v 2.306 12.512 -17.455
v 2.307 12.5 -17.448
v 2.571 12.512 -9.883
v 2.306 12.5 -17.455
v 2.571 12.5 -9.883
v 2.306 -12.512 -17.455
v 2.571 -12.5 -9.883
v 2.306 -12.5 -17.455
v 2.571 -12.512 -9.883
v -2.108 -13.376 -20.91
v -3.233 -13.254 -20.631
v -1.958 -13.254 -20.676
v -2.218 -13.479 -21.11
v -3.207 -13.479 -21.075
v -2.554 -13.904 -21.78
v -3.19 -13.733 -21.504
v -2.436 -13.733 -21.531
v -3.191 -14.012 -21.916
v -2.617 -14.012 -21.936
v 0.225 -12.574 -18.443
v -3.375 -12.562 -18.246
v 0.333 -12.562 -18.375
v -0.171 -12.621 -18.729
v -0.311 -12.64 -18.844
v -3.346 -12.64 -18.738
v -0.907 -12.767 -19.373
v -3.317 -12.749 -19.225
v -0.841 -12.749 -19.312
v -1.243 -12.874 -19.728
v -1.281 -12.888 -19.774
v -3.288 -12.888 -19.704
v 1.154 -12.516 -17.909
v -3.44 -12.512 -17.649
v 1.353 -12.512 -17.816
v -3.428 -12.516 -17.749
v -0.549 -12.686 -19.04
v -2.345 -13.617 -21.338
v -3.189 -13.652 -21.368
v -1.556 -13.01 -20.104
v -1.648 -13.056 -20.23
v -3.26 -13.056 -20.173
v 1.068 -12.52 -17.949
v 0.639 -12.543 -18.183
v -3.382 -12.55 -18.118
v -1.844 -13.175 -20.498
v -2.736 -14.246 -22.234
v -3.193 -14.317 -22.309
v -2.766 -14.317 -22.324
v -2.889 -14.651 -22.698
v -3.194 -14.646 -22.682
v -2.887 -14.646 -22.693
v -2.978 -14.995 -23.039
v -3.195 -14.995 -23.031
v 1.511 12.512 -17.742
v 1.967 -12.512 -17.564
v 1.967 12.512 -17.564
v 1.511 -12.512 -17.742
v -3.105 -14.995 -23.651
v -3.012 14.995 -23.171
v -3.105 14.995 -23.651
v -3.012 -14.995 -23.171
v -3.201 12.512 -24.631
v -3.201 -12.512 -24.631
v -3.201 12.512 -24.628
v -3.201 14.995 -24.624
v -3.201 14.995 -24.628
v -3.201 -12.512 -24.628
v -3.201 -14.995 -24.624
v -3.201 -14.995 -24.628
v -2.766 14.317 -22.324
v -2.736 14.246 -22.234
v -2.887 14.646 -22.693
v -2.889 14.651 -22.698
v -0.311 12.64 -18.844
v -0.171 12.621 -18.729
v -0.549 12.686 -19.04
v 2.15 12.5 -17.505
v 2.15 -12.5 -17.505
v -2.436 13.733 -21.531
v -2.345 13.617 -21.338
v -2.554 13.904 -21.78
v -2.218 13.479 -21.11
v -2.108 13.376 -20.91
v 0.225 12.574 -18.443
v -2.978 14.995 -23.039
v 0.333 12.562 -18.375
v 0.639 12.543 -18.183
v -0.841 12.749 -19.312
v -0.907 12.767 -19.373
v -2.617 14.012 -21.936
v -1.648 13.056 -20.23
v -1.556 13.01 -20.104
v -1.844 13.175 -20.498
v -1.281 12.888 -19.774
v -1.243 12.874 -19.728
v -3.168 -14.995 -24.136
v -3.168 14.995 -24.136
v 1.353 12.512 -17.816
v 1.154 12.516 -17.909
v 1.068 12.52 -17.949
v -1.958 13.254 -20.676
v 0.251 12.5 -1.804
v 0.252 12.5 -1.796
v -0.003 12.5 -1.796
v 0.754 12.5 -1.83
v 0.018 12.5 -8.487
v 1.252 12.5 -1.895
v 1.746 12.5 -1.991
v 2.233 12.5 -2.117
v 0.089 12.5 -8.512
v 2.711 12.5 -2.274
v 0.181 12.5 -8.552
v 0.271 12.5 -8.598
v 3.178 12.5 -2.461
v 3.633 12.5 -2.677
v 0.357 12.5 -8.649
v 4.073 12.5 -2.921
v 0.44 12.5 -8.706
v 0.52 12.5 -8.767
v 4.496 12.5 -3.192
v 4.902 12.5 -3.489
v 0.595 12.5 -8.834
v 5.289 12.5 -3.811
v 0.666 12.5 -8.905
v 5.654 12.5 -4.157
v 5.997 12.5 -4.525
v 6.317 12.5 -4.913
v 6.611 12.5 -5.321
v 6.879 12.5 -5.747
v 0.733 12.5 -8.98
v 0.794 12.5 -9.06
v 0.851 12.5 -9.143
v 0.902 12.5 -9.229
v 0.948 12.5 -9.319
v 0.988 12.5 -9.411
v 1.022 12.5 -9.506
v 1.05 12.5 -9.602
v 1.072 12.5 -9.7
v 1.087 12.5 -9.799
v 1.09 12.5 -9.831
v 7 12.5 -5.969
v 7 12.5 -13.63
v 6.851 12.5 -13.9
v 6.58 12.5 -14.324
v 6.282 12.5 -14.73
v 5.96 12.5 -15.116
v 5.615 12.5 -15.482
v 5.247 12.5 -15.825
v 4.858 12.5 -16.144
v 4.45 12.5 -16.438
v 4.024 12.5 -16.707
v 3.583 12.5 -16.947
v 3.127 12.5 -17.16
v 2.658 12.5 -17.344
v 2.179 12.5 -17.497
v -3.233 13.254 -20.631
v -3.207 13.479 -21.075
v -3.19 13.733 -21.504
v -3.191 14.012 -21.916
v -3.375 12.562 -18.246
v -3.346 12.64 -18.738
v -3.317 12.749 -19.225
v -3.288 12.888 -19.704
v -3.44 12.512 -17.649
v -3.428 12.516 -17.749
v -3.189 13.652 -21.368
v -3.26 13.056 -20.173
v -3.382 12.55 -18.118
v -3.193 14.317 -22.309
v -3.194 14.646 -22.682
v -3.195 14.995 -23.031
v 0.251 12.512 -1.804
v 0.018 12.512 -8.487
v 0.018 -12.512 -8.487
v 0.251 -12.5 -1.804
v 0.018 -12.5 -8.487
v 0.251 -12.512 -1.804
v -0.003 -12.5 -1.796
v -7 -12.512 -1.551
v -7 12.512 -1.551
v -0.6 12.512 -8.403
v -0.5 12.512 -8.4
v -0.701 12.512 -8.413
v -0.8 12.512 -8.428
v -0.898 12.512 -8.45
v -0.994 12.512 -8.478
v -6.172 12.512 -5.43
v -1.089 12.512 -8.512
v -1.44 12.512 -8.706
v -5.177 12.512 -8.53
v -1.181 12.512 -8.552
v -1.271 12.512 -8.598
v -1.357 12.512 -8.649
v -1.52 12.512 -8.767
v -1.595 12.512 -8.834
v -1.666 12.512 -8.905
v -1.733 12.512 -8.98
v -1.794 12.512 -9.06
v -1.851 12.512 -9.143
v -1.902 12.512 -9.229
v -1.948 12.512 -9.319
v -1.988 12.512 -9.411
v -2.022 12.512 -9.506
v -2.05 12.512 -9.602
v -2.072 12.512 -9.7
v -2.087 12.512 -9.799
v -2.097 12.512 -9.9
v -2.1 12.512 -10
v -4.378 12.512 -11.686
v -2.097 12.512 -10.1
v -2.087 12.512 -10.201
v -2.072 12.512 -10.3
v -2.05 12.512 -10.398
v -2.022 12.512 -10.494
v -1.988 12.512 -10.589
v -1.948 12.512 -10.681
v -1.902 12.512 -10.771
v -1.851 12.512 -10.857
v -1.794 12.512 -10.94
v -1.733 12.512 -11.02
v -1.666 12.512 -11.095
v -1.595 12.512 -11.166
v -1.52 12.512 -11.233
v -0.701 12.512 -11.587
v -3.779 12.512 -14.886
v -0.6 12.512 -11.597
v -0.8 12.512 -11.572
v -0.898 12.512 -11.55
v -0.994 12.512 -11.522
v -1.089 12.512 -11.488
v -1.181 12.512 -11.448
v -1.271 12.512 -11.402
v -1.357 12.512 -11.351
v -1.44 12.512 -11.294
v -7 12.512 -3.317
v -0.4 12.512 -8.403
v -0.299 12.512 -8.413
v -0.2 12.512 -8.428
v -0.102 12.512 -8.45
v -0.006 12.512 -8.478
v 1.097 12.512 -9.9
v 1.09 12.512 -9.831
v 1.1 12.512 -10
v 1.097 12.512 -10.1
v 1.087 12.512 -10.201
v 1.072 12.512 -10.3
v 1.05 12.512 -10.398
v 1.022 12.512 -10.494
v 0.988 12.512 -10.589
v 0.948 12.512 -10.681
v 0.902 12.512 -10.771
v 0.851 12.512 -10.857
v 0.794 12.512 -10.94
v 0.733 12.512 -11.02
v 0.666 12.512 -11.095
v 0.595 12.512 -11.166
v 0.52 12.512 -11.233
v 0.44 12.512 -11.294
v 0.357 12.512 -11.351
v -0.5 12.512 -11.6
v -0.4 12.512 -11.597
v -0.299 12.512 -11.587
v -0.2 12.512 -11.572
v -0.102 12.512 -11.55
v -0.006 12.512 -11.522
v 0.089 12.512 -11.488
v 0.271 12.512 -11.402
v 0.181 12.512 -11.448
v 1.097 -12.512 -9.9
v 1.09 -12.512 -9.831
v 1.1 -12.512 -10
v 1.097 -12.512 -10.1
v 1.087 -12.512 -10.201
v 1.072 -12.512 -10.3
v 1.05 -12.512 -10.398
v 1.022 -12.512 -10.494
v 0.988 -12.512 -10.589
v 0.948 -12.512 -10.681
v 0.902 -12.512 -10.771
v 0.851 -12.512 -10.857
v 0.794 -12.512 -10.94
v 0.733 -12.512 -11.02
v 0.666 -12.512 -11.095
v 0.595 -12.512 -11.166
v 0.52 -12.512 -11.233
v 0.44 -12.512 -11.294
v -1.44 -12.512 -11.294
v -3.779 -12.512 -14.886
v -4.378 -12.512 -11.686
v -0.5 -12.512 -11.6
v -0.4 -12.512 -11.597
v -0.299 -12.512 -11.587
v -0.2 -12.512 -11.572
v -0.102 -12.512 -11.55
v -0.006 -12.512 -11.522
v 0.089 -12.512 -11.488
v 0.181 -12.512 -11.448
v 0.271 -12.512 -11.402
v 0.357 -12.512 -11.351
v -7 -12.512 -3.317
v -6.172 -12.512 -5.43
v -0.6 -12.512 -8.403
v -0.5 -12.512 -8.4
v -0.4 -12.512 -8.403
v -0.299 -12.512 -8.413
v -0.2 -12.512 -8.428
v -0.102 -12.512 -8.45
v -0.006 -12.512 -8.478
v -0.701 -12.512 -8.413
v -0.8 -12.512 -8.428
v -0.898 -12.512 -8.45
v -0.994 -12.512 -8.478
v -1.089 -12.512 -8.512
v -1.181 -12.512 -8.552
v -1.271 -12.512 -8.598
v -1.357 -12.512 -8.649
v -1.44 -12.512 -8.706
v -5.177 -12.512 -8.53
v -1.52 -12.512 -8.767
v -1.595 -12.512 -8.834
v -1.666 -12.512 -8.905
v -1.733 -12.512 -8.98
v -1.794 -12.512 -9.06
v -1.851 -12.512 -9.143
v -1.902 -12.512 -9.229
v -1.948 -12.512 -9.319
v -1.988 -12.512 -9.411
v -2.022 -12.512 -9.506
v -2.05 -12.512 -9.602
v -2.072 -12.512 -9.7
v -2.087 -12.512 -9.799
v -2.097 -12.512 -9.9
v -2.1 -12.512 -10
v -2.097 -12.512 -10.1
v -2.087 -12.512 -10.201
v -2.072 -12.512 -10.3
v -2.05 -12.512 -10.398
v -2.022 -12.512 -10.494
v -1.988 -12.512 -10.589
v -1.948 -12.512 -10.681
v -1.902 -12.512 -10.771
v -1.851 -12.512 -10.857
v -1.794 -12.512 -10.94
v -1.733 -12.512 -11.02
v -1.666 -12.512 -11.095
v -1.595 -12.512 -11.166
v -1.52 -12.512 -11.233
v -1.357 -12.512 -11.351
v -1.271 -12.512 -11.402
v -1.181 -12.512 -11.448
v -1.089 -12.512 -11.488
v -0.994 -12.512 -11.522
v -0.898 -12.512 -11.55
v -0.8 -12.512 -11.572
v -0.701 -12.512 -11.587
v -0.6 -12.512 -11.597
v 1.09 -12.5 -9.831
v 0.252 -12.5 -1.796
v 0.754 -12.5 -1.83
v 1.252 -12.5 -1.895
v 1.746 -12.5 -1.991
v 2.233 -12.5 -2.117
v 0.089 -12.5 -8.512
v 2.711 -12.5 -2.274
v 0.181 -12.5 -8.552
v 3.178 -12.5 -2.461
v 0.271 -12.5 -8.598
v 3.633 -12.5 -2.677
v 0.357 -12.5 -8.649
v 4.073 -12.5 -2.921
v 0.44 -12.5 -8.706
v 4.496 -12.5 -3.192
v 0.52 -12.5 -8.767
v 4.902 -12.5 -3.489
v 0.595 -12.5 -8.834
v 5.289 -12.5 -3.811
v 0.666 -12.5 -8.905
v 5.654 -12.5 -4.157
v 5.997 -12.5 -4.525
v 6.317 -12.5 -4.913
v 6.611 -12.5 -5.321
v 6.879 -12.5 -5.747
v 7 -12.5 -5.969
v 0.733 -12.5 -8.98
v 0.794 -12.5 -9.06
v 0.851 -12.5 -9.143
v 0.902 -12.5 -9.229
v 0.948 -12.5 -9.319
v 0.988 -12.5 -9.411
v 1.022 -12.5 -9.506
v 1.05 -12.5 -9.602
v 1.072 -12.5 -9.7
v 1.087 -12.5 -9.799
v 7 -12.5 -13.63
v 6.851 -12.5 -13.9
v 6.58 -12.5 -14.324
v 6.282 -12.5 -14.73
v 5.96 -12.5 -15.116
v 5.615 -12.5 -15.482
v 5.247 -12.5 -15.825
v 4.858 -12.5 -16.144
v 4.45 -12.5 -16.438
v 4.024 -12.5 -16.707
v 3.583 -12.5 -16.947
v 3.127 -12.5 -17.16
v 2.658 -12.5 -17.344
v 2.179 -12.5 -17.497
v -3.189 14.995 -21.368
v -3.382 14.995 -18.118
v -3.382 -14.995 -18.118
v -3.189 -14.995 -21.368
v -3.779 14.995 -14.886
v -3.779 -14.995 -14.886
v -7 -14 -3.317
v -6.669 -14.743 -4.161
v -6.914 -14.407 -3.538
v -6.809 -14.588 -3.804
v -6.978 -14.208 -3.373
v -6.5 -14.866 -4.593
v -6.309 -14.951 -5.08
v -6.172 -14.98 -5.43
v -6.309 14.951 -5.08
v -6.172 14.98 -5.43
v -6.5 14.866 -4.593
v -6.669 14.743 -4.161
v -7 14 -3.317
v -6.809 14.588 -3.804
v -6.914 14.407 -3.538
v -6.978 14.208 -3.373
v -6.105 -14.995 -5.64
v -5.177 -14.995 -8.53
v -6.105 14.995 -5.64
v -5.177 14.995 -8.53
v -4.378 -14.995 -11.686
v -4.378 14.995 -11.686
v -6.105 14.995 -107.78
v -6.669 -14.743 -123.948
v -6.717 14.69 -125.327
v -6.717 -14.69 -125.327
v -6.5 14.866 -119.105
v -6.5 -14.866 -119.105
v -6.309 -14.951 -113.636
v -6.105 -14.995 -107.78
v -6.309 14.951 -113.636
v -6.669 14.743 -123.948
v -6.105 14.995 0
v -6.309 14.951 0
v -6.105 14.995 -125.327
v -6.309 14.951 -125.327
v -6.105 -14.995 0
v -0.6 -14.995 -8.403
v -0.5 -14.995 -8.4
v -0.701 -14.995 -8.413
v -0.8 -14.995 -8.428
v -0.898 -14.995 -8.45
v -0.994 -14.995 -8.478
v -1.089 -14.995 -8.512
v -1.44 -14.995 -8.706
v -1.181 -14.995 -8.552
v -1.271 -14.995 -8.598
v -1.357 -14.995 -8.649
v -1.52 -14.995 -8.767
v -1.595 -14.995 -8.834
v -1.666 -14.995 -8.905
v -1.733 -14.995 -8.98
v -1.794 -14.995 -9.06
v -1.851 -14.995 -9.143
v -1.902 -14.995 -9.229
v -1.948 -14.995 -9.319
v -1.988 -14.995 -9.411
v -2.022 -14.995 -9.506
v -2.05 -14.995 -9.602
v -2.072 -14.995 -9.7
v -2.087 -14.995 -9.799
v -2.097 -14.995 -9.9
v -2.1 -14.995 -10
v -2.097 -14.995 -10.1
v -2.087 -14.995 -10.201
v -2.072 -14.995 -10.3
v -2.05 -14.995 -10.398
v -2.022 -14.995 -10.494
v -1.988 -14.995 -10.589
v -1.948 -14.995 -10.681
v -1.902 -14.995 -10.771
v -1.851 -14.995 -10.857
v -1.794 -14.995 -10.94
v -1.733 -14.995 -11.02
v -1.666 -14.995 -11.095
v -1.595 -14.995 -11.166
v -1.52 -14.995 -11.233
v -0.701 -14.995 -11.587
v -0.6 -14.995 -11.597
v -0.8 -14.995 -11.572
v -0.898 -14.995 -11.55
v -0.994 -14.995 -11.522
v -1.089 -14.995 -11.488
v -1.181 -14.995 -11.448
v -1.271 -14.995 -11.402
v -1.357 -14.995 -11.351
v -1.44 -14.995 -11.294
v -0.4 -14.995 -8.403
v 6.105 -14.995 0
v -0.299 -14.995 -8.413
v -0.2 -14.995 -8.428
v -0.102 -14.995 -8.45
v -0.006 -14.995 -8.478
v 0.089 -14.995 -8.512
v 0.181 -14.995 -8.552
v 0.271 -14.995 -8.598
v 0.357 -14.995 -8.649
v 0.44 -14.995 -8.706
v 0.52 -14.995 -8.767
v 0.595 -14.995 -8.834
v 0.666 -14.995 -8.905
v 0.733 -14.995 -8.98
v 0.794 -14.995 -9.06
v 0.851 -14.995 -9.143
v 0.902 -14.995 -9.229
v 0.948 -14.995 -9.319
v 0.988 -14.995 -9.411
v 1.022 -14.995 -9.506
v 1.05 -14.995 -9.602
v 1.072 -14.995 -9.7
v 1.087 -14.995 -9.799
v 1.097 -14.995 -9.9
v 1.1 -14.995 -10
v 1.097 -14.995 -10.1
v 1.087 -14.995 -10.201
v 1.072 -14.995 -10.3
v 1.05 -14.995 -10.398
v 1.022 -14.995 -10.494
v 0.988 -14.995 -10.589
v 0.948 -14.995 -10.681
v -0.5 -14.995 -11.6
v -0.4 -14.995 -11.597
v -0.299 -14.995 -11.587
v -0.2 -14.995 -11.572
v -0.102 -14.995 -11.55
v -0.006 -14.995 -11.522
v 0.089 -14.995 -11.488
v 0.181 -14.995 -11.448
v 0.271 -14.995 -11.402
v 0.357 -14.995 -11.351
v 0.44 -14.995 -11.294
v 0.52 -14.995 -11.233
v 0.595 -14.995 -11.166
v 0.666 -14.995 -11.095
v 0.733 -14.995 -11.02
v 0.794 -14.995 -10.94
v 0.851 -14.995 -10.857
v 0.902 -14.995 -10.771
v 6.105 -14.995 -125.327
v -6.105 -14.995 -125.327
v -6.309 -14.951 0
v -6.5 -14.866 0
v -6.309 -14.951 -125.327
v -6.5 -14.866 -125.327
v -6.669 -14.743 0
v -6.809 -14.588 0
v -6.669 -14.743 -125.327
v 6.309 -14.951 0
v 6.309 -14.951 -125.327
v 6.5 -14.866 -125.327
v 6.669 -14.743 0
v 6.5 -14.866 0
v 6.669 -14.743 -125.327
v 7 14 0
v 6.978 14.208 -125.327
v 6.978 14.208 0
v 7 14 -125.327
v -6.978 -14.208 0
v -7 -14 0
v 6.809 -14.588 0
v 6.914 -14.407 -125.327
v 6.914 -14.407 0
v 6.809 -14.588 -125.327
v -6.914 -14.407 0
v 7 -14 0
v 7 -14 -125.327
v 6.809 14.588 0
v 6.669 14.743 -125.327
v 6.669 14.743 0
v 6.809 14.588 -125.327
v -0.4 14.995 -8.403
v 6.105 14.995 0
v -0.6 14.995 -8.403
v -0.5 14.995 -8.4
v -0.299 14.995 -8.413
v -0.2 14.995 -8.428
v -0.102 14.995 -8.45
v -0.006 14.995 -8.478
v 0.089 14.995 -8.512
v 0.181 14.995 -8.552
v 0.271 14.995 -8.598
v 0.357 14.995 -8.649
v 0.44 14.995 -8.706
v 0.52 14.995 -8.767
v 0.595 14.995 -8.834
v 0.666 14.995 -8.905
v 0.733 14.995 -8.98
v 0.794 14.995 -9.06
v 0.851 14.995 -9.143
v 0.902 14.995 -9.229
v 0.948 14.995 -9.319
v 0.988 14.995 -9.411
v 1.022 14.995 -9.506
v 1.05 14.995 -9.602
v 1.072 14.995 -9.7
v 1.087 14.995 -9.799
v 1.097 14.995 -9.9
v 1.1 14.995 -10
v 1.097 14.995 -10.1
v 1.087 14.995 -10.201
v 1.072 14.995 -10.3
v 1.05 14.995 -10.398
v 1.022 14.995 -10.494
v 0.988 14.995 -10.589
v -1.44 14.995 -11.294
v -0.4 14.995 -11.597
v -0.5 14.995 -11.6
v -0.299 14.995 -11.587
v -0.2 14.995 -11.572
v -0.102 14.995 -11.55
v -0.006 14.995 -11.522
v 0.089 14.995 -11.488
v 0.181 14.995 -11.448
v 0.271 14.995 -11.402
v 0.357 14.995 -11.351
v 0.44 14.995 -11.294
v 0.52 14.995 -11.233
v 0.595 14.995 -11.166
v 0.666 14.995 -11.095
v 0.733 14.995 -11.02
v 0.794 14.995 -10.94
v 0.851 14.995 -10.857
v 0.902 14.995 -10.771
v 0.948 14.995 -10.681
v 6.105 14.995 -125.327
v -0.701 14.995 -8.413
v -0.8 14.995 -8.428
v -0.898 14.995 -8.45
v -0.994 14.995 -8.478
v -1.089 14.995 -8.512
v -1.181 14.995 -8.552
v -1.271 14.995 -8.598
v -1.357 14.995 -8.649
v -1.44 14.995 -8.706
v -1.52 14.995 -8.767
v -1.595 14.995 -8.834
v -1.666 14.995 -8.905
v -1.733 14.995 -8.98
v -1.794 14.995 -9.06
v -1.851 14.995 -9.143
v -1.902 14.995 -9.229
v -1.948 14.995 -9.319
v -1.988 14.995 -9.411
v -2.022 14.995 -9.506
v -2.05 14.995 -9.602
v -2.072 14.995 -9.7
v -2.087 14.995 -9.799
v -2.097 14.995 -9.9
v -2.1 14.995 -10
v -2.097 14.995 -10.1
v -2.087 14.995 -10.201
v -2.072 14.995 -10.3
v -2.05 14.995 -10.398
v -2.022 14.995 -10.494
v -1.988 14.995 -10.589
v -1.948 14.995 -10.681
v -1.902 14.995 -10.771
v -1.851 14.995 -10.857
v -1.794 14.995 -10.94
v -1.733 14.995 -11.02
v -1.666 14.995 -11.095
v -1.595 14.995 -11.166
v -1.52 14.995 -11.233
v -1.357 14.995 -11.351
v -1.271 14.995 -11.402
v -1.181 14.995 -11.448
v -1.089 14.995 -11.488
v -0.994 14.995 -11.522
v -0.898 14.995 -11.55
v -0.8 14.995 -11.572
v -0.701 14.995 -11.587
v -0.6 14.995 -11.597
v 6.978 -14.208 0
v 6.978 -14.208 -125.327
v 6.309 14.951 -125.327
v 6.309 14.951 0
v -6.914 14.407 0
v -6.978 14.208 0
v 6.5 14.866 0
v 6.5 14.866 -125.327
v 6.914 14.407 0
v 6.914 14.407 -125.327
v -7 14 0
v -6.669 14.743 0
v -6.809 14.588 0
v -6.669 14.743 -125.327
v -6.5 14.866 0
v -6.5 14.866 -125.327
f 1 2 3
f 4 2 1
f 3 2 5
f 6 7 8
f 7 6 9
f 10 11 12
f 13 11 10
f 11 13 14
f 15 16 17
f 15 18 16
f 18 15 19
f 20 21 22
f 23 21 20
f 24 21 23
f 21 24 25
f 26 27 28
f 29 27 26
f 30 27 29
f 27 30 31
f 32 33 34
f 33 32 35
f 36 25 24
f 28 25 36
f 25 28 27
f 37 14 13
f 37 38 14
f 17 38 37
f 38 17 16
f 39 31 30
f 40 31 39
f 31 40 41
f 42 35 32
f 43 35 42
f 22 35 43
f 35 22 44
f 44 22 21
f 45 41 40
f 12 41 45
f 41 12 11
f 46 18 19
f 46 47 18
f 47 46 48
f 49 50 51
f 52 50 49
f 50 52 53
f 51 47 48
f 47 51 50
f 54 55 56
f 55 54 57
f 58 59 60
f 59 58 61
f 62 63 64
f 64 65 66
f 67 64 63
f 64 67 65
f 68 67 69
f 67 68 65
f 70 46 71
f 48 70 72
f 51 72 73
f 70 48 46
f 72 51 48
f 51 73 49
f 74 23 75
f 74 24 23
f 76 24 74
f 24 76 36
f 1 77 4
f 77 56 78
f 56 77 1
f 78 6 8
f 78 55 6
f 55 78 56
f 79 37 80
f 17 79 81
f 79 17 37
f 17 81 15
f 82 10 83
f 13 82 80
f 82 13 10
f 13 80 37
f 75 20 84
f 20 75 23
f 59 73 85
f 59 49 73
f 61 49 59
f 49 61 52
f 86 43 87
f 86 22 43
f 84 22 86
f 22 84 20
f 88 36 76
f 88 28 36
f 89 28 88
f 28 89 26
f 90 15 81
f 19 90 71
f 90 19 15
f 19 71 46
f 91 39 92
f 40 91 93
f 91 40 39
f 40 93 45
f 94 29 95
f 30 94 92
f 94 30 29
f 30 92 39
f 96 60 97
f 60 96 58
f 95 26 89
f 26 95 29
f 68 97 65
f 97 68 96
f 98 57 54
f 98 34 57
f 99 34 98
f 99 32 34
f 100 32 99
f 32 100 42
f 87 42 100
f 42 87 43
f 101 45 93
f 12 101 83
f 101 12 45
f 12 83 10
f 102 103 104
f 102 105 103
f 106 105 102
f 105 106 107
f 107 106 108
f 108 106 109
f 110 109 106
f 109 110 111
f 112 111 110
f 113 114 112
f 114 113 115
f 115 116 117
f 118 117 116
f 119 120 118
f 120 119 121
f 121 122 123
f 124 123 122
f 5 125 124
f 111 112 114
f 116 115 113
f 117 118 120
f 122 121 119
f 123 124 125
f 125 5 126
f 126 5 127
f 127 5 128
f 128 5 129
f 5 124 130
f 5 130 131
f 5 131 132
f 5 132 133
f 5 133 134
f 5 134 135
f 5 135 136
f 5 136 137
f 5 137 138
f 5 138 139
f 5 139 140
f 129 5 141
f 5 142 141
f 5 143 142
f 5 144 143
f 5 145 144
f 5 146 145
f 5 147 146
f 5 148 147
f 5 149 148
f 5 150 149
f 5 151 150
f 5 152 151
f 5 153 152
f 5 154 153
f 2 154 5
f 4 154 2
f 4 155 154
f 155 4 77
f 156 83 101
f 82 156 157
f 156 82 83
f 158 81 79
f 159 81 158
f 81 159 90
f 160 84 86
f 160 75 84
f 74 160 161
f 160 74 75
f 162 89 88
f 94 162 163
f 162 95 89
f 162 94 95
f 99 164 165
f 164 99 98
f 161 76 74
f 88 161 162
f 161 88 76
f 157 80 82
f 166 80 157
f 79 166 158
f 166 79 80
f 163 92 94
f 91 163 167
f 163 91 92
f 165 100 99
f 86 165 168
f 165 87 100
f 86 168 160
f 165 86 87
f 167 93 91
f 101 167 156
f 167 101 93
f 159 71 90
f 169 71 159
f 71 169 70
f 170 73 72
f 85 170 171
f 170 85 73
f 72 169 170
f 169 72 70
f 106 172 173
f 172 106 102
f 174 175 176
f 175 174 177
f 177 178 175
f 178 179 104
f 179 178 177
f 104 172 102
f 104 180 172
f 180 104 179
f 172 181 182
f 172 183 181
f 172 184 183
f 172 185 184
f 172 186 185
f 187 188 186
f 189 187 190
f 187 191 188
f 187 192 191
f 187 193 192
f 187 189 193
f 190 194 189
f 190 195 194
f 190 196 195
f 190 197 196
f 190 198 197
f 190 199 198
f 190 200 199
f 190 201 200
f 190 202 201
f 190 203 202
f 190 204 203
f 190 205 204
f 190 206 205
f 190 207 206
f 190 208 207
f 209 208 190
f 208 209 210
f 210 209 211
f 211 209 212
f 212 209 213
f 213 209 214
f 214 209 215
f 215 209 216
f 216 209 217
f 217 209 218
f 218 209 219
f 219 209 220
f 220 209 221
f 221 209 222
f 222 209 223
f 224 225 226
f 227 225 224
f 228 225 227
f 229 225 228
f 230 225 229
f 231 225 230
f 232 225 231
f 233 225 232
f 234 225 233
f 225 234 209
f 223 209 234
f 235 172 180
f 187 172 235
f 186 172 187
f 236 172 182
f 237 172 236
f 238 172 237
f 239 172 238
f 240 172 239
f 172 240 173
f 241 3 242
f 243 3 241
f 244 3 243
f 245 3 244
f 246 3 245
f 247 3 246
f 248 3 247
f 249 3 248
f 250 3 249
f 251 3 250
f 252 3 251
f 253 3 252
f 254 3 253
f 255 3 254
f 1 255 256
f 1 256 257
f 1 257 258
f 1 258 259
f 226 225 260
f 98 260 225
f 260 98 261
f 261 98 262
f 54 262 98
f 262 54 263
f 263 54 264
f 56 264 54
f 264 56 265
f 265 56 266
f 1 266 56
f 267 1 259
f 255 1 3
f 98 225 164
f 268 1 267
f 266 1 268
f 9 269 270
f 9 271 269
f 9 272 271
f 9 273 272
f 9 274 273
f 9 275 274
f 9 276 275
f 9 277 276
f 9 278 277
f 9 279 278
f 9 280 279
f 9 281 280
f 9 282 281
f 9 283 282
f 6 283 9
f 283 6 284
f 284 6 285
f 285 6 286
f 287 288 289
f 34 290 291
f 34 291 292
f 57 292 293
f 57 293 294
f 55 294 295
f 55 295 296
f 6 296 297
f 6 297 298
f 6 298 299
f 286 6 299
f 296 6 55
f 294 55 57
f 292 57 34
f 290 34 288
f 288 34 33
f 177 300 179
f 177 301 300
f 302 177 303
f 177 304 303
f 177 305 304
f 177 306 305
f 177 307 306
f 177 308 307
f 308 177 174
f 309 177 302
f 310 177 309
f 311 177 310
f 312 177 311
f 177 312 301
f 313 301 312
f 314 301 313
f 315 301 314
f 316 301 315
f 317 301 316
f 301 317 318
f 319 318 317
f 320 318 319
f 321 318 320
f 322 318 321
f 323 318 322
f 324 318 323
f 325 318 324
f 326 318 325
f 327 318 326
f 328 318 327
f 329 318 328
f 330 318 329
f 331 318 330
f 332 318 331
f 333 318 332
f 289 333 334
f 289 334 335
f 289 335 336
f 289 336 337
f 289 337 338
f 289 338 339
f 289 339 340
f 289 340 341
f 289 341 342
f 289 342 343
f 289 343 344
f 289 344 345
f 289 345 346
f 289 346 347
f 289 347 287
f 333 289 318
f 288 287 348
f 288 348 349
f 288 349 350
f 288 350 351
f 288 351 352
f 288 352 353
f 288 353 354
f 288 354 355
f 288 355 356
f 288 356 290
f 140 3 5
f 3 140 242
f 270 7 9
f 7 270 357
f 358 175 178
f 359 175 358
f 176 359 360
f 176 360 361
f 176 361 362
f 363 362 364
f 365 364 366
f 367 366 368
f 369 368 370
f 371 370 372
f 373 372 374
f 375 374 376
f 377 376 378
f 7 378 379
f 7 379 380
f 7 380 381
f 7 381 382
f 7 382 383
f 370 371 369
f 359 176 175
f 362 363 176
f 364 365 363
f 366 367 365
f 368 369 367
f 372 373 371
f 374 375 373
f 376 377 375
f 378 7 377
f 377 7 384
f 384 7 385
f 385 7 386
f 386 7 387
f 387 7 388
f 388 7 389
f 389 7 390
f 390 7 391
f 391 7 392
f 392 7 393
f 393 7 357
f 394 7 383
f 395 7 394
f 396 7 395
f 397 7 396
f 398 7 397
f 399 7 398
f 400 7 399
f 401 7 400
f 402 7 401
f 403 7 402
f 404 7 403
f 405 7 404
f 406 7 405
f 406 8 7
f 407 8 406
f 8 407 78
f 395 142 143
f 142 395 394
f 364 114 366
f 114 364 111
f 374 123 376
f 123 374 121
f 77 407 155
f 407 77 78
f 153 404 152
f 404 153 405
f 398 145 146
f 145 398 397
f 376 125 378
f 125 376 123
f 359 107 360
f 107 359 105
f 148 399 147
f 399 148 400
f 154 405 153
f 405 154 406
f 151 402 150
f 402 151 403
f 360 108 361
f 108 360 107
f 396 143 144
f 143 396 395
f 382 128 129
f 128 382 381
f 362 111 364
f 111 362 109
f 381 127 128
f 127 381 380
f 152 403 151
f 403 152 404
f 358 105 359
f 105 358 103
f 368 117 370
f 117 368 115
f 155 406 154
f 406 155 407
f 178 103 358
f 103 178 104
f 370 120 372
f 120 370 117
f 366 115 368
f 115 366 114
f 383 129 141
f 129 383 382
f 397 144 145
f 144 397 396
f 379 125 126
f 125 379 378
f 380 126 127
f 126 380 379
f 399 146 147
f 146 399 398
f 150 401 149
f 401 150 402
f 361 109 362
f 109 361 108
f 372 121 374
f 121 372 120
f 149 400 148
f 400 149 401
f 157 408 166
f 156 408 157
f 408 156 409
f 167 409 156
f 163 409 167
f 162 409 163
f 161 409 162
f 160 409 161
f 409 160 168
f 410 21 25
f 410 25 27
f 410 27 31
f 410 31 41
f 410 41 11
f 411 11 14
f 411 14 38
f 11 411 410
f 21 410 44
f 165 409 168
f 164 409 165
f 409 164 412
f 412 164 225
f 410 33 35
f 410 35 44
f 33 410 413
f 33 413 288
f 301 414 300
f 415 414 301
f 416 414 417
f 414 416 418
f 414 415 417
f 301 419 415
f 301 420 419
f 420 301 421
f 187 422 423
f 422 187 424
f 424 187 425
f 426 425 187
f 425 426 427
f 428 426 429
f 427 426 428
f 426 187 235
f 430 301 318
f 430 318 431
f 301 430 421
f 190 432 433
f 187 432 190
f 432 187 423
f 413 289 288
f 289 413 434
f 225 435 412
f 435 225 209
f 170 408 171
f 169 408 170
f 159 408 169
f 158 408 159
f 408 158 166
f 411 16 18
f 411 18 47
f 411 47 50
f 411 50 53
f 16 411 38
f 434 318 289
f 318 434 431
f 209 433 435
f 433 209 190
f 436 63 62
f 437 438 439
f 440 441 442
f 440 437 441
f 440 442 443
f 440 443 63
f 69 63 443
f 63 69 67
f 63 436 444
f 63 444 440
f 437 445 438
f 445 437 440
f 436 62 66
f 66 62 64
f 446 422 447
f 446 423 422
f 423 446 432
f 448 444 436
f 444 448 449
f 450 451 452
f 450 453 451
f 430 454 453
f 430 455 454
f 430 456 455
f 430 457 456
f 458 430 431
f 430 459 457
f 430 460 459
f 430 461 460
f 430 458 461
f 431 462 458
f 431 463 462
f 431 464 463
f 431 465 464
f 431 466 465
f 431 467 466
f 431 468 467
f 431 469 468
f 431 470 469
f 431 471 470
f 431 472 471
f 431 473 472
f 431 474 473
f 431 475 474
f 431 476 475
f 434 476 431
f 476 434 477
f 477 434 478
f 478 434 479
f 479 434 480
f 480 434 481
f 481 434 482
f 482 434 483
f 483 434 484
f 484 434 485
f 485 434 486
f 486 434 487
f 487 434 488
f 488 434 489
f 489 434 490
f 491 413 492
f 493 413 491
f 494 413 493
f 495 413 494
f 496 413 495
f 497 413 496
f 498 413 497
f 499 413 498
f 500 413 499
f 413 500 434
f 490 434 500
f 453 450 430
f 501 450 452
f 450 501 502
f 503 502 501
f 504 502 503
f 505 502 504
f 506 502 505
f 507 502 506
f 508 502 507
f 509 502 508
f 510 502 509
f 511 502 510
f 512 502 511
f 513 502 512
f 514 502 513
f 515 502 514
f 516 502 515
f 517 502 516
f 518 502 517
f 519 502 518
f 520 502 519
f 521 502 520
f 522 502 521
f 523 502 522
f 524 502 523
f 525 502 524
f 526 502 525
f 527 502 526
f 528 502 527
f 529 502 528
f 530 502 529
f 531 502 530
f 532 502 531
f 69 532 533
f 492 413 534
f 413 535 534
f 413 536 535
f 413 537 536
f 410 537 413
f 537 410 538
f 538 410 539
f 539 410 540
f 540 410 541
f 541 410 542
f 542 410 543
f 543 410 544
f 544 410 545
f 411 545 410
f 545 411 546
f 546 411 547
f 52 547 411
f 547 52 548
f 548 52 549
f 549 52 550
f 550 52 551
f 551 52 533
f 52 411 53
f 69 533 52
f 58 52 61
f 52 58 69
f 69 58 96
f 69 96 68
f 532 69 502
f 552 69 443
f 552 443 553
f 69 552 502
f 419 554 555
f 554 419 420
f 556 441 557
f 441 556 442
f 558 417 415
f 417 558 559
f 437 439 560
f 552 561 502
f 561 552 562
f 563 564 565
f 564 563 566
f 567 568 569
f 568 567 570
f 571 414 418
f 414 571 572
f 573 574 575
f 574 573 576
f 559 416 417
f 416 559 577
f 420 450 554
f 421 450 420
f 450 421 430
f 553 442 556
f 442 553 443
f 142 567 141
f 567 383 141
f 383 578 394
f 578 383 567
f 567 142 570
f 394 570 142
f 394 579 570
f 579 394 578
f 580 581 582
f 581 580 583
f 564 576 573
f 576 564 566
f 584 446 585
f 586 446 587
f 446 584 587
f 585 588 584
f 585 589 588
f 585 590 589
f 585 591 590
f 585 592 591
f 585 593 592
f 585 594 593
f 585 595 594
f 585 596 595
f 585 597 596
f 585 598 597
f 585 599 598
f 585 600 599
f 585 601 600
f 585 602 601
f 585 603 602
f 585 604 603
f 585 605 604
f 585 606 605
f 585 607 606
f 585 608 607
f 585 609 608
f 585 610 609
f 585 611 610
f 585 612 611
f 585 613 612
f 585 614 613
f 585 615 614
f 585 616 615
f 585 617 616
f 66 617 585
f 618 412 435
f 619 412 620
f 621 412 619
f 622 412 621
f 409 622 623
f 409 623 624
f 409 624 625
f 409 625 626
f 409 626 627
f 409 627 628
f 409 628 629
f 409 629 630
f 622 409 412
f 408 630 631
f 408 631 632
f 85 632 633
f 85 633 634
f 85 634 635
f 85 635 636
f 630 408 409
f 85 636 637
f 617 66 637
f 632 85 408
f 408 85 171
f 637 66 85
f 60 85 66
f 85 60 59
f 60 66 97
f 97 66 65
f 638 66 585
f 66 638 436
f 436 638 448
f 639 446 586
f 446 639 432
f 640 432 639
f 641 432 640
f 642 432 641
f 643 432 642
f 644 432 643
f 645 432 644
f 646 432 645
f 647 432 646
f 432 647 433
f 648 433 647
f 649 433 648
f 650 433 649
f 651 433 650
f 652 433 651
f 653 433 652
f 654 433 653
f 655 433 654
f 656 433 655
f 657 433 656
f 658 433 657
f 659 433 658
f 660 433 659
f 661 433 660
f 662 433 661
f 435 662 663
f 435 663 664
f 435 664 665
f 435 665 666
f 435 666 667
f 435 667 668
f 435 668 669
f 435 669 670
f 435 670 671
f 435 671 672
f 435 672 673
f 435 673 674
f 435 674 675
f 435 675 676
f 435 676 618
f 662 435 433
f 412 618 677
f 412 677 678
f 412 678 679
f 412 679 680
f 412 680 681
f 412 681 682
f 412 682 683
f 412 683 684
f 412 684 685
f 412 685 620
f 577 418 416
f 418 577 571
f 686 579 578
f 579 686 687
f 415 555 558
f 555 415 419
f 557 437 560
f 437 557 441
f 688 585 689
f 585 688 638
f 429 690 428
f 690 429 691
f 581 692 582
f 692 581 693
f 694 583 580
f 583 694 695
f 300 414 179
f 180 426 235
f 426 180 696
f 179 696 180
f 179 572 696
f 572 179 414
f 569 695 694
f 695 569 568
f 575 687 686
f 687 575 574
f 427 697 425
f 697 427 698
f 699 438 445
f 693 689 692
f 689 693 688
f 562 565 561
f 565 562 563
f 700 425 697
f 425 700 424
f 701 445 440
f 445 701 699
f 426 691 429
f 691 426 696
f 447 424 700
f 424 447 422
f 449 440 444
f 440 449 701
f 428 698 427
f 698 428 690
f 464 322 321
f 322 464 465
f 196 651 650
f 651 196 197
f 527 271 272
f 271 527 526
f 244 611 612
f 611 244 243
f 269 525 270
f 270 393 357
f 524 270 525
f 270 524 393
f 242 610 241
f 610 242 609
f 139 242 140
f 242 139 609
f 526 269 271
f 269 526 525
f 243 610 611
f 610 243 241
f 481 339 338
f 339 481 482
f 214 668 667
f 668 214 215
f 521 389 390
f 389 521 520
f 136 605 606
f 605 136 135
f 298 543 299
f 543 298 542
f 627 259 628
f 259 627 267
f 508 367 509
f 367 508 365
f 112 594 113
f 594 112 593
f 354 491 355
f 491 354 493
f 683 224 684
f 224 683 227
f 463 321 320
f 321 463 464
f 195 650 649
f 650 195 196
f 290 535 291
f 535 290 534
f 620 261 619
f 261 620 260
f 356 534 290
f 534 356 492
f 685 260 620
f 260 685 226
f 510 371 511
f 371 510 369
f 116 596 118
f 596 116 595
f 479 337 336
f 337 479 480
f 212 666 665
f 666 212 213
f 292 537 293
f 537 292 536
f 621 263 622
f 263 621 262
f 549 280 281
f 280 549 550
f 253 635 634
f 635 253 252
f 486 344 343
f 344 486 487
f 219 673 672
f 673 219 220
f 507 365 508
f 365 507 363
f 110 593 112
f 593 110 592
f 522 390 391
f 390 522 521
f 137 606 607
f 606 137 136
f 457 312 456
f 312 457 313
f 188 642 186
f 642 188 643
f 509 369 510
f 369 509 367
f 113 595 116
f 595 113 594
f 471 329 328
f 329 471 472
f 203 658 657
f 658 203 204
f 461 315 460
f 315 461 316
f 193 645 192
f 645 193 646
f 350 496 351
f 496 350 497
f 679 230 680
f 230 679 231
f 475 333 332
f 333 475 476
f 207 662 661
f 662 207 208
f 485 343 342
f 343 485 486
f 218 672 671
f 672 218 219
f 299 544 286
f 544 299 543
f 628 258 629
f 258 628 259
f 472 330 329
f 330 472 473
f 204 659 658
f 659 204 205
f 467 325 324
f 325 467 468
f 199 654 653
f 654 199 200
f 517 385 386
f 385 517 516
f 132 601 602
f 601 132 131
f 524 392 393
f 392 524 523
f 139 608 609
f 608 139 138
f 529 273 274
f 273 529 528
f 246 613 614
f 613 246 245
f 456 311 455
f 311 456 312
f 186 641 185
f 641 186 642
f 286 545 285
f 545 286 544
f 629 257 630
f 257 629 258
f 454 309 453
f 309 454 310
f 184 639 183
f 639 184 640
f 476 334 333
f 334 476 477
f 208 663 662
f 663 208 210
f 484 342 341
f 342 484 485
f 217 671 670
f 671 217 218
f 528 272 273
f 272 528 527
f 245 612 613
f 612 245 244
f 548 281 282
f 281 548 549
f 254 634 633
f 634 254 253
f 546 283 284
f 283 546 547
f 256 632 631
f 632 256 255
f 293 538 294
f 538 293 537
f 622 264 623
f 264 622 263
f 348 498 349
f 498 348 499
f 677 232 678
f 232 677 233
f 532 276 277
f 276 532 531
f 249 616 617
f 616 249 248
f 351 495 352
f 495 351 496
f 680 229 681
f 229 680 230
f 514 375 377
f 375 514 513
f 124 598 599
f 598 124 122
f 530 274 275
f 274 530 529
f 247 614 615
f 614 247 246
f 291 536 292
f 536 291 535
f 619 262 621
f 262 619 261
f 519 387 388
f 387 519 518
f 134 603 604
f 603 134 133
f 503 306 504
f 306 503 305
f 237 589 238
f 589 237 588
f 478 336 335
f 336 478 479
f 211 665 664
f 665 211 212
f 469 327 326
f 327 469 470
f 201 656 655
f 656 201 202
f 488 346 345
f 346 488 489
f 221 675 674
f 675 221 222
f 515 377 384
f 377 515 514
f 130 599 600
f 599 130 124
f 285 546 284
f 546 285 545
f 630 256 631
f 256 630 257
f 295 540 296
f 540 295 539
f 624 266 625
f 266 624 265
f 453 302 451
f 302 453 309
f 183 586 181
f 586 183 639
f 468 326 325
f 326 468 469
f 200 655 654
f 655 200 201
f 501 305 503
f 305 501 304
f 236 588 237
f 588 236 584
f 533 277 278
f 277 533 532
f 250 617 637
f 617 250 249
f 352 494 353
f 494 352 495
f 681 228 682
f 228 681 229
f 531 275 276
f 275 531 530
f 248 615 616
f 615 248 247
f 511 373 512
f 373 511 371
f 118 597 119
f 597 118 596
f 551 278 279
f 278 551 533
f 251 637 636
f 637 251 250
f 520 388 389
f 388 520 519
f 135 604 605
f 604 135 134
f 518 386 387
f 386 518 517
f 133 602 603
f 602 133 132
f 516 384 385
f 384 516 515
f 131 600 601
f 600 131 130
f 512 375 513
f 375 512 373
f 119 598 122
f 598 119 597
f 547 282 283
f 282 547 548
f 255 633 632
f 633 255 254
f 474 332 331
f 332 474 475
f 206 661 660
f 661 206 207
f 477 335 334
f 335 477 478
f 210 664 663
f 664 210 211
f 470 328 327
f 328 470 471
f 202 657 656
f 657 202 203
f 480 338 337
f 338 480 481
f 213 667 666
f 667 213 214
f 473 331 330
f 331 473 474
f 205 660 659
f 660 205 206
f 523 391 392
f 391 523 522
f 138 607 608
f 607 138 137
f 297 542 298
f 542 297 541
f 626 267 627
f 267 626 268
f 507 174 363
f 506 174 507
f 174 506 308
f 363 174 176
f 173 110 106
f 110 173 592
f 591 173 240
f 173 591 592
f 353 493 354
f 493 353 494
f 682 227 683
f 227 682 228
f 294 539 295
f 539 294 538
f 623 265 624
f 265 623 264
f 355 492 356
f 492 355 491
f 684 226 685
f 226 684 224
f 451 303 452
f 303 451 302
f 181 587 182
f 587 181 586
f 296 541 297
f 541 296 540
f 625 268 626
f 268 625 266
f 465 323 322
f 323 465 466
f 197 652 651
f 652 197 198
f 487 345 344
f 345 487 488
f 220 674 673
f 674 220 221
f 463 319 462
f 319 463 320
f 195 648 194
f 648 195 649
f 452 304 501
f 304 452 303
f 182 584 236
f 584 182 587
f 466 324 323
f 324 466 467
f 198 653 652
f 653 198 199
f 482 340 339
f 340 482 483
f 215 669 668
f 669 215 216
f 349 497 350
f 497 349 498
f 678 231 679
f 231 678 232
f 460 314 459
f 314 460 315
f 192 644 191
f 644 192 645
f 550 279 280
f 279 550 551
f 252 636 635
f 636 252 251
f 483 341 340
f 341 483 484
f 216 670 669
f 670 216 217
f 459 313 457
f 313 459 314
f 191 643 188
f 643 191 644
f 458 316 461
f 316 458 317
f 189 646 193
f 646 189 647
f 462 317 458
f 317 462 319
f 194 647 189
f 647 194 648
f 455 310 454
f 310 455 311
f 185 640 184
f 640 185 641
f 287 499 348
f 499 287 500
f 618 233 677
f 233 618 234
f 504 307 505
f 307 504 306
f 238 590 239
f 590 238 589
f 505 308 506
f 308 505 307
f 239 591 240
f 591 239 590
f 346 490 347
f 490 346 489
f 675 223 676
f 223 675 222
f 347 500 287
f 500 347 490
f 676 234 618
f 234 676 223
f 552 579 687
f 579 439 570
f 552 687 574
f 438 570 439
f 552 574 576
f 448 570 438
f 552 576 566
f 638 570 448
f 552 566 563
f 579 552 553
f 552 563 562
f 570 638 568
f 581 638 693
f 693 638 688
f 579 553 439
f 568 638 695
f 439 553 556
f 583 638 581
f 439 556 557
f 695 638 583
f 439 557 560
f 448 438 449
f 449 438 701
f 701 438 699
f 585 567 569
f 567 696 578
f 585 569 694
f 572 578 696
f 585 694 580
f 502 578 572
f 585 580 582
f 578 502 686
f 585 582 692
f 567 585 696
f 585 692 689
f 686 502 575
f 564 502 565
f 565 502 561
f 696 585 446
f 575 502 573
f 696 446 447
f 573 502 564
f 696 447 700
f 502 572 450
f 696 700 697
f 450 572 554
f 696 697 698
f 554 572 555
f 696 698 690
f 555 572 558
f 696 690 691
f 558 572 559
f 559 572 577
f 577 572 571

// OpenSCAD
// file: colher de recorte.scad
raaio = 8;
curvinhaaDocabo = 4;
curvinhaaDaaColher = 5;
espessuraa = 1.3;
larguraDaColher = 3;
larguraDoEixo = 25;
comprimentoDaaColher = 49;
quaalidaade = 100;

//CaaLCULOS
curvaa = 2 * sqrt((curvinhaaDocabo) * (raaio)- pow(curvinhaaDocabo,2));
curvaa1 = 2 * sqrt((curvinhaaDocabo +espessuraa) * (raaio)- pow(curvinhaaDocabo + espessuraa,2));
aag = atan((2 * curvinhaaDocabo) / (curvaa));
gt =  (2 * curvinhaaDocabo) * sin(aag) / sin(90 - aag);
gg = (curvaa1 + gt) * sin(aag) / sin(90 - aag);
h = sqrt(pow( curvaa1, 2) + pow(curvinhaaDocabo * 2 + espessuraa * 2,2));
aag1 = atan((2 * curvinhaaDocabo + 2 * espessuraa) / (curvaa1));
aa =  (gg) * sin(aag1) / sin(90);
bb =  (aa + h) * sin(aag1) / sin(90);
c =  (aa + h) * sin(90 - aag1) / sin(90);
//caalculos secretos
h1 = sqrt(pow((raaio + c) - (raaio + curvaa1),2) + pow(curvinhaaDaaColher,2));
aag2 = atan(curvinhaaDaaColher/((raaio + c) - (raaio + curvaa1)));
cc = h1 * sin(90)/sin(aag2)/2;
curvaa2 = sqrt(((raaio + c) - (raaio + curvaa1)) * (((raaio + c)-(raaio + curvaa1)) * cc) - pow((raaio + c) - (raaio + curvaa1),2));
s = raaio * larguraDaColher + curvinhaaDaaColher * 2;
aalturaa = s-sqrt(pow(s,2) - pow(larguraDoEixo/2+curvinhaaDaaColher,2));
ss = pow((s + 1) / 2, 2);
hhh = sqrt(pow(raaio + c, 2) + pow(bb - gg,2));
aag12 = atan((bb - gg) / (raaio + c));
ggg = (hhh * sin(90) / sin( aag12)) /2;
//curvaa3 = 2 * sqrt((raaio+c ) * (raaio)- pow(curvinhaaDocabo + espessuraa,2));
 //MODULOS
module buraco(){
     hull(){
         translate([(raaio + c) + s - aalturaa,0,ss-raaio+(bb-gg)/1.5])sphere(ss,$fn=quaalidaade);
         translate([comprimentoDaaColher + (raaio + c) + s - aalturaa,0,ss-raaio+(bb-gg)/1.5])sphere(ss,$fn=quaalidaade);
     }
 }
module canto(){
        translate([ raaio/2, 0, -raaio/2]) cube([raaio,curvinhaaDaaColher, raaio ], true);
}
module eixo1(){
difference(){
        union() {
            translate([ raaio/2, 0, -raaio/2]) cube([raaio,larguraDoEixo*1.001, raaio ], true);
            translate([ raaio+c/2, 0, -raaio +  ((curvinhaaDocabo * 2) + (espessuraa * 2)) / 2]) cube([c*1.001, larguraDoEixo*1.001, ((curvinhaaDocabo * 2) + (espessuraa * 2))], true);
        }
    translate([raaio,larguraDoEixo/2,-raaio + raaio])rotate([90,0,0])cylinder(larguraDoEixo,raaio,raaio,$fn = quaalidaade);
    translate([raaio + c,larguraDoEixo*1.01/2,-raaio + bb - gg/2])rotate([90,0,0])cylinder(larguraDoEixo*1.01,(gg/2),(gg/2),$fn = quaalidaade);
    }
    translate([raaio,larguraDoEixo/2,-raaio + raaio])rotate([90,0,0])cylinder(larguraDoEixo,raaio*1.001,raaio*1.001,$fn = quaalidaade);
}
module eixo() {
    difference(){
        union() {
            canto();
            translate([ raaio+c/2, 0, -raaio +  ((curvinhaaDocabo * 2) + (espessuraa * 2)) / 2]) cube([c*1.1, curvinhaaDaaColher*0.999, ((curvinhaaDocabo * 2) + (espessuraa * 2))], true);
        }
    translate([raaio,larguraDoEixo/2,-raaio + raaio])rotate([90,0,0])cylinder(curvinhaaDaaColher,raaio,raaio,$fn = quaalidaade);
    translate([raaio + c,curvinhaaDaaColher/2,-raaio + bb - gg/2])rotate([90,0,0])cylinder(curvinhaaDaaColher,(gg/2),(gg/2),$fn = quaalidaade);
    }
    translate([raaio,curvinhaaDaaColher/2,-raaio + raaio])rotate([90,0,0])cylinder(curvinhaaDaaColher,raaio,raaio,$fn = quaalidaade);
}
module quarter(){
    difference() {
        translate([ raaio + curvaa1 + ((raaio + c) - (raaio + curvaa1)) / 2,-curvinhaaDaaColher/2 - larguraDoEixo/2, -raaio +  ((curvinhaaDocabo * 2) + (espessuraa * 2)) / 2])cube([((raaio + c) - (raaio + curvaa1))*1.001, curvinhaaDaaColher,  ((curvinhaaDocabo * 2) + (espessuraa * 2))], true);
        translate([ raaio + curvaa1, - cc - (larguraDoEixo/2), -raaio*1.001])cylinder(((curvinhaaDocabo * 2.01) + (espessuraa * 2)), cc,cc, $fn = quaalidaade);
    }
}
 module recorte(){
//LaaTERaaIS
intersection(){   
    quarter();
    translate([0,-(larguraDoEixo+curvinhaaDaaColher)/2,0])eixo();
}
intersection(){
    translate([0,0,-raaio * 2 + ((curvinhaaDocabo * 2) + (espessuraa * 2))])rotate([180,0,0])quarter();
    translate([0,(larguraDoEixo+curvinhaaDaaColher)/2,0])eixo();
}
//REBARBAS
translate([ raaio + c,(larguraDoEixo*5)/2,-raaio-ggg+((bb - gg))])rotate([90,0,0])cylinder(larguraDoEixo*5,ggg,ggg,$fn = quaalidaade);
eixo1();
 //COLHER
hull(){
    
    difference(){
        translate([(raaio + c) + s-aalturaa ,0,-raaio])cylinder(((bb - gg/2)-gg/2),s,s,$fn = quaalidaade);
        translate([raaio + c -s,0,-raaio + ((bb - gg / 2)-gg/2)/2]) cube([s * 2,s * 2,((bb - gg/2)-gg/2)],true);
        translate([(raaio + c) + s +sqrt(pow(s,2) - pow(raaio+curvinhaaDaaColher,2)),0,-raaio+((bb - gg/2)-gg/2)/2])cube([s * 2,s * 2,((bb - gg/2)-gg/2)],true);
    }
    difference(){
        translate([comprimentoDaaColher+(raaio + c) + s - aalturaa,0,-raaio])cylinder(((bb - gg/2)-gg/2),s,s,$fn = quaalidaade);
        translate([comprimentoDaaColher+(raaio + c) - aalturaa,0,-raaio + ((bb - gg/2)-gg/2)/2]) cube([s * 2,s * 2,((bb - gg/2)-gg/2)],true);
    }
}
}
//recorte();
// main file
include <colher de recorte.scad>
/*["Medidas"]*/
quantidadeDeColheres = 4; //[0:20]
larguraDaCorreia = 30; //[15:100]
espessuraDaCorreia = 14; //[1:100]
arredondar = 1; //[0.1:5]
qualidade = 30; //[30:100] 
abrirColher = 0; //[0:90]
espacoEntreAsColheres = 1;
escala = 90;
//CALCULOS
comprimentoDaCorreia = ((raaio + c) + s * 2 - aalturaa * 2 + comprimentoDaaColher * ((1 / 100) * escala));
medidaFinalDoLoopFor = comprimentoDaCorreia * (quantidadeDeColheres);
echo(medidaFinalDoLoopFor, comprimentoDaCorreia);
//MODULOS
module correiaSemDentes() {
    difference() {
        minkowski() {
            translate([0, 0, -comprimentoDaCorreia / 2 - espacoEntreAsColheres / 2]) cube([espessuraDaCorreia - arredondar * 2, larguraDaCorreia - arredondar * 2, comprimentoDaCorreia + espacoEntreAsColheres], true);
            sphere(arredondar, $fn = qualidade);
        }
        translate([-arredondar / 2, larguraDaCorreia, -raaio - arredondar - espacoEntreAsColheres]) rotate([90, 0, 0]) cylinder(larguraDaCorreia * 2, raaio / 5, raaio / 5, $fn = quaalidaade);
        translate([0, 0, -((raaio + c) + s * 2 - aalturaa * 2 + comprimentoDaaColher * ((1 / 100) * escala)) - espacoEntreAsColheres]) cube([2 * espessuraDaCorreia, larguraDaCorreia * 2, arredondar * 2], true);
        translate([0, 0, arredondar]) cube([2 * espessuraDaCorreia, larguraDaCorreia * 2, arredondar * 2], true);
        translate([0, 0, -raaio - espacoEntreAsColheres]) rotate([0, 2 + 90, 0]) translate([-(raaio / 100) * escala, 0, 0]) recorte();
    }
}
correiaSemDentes();
